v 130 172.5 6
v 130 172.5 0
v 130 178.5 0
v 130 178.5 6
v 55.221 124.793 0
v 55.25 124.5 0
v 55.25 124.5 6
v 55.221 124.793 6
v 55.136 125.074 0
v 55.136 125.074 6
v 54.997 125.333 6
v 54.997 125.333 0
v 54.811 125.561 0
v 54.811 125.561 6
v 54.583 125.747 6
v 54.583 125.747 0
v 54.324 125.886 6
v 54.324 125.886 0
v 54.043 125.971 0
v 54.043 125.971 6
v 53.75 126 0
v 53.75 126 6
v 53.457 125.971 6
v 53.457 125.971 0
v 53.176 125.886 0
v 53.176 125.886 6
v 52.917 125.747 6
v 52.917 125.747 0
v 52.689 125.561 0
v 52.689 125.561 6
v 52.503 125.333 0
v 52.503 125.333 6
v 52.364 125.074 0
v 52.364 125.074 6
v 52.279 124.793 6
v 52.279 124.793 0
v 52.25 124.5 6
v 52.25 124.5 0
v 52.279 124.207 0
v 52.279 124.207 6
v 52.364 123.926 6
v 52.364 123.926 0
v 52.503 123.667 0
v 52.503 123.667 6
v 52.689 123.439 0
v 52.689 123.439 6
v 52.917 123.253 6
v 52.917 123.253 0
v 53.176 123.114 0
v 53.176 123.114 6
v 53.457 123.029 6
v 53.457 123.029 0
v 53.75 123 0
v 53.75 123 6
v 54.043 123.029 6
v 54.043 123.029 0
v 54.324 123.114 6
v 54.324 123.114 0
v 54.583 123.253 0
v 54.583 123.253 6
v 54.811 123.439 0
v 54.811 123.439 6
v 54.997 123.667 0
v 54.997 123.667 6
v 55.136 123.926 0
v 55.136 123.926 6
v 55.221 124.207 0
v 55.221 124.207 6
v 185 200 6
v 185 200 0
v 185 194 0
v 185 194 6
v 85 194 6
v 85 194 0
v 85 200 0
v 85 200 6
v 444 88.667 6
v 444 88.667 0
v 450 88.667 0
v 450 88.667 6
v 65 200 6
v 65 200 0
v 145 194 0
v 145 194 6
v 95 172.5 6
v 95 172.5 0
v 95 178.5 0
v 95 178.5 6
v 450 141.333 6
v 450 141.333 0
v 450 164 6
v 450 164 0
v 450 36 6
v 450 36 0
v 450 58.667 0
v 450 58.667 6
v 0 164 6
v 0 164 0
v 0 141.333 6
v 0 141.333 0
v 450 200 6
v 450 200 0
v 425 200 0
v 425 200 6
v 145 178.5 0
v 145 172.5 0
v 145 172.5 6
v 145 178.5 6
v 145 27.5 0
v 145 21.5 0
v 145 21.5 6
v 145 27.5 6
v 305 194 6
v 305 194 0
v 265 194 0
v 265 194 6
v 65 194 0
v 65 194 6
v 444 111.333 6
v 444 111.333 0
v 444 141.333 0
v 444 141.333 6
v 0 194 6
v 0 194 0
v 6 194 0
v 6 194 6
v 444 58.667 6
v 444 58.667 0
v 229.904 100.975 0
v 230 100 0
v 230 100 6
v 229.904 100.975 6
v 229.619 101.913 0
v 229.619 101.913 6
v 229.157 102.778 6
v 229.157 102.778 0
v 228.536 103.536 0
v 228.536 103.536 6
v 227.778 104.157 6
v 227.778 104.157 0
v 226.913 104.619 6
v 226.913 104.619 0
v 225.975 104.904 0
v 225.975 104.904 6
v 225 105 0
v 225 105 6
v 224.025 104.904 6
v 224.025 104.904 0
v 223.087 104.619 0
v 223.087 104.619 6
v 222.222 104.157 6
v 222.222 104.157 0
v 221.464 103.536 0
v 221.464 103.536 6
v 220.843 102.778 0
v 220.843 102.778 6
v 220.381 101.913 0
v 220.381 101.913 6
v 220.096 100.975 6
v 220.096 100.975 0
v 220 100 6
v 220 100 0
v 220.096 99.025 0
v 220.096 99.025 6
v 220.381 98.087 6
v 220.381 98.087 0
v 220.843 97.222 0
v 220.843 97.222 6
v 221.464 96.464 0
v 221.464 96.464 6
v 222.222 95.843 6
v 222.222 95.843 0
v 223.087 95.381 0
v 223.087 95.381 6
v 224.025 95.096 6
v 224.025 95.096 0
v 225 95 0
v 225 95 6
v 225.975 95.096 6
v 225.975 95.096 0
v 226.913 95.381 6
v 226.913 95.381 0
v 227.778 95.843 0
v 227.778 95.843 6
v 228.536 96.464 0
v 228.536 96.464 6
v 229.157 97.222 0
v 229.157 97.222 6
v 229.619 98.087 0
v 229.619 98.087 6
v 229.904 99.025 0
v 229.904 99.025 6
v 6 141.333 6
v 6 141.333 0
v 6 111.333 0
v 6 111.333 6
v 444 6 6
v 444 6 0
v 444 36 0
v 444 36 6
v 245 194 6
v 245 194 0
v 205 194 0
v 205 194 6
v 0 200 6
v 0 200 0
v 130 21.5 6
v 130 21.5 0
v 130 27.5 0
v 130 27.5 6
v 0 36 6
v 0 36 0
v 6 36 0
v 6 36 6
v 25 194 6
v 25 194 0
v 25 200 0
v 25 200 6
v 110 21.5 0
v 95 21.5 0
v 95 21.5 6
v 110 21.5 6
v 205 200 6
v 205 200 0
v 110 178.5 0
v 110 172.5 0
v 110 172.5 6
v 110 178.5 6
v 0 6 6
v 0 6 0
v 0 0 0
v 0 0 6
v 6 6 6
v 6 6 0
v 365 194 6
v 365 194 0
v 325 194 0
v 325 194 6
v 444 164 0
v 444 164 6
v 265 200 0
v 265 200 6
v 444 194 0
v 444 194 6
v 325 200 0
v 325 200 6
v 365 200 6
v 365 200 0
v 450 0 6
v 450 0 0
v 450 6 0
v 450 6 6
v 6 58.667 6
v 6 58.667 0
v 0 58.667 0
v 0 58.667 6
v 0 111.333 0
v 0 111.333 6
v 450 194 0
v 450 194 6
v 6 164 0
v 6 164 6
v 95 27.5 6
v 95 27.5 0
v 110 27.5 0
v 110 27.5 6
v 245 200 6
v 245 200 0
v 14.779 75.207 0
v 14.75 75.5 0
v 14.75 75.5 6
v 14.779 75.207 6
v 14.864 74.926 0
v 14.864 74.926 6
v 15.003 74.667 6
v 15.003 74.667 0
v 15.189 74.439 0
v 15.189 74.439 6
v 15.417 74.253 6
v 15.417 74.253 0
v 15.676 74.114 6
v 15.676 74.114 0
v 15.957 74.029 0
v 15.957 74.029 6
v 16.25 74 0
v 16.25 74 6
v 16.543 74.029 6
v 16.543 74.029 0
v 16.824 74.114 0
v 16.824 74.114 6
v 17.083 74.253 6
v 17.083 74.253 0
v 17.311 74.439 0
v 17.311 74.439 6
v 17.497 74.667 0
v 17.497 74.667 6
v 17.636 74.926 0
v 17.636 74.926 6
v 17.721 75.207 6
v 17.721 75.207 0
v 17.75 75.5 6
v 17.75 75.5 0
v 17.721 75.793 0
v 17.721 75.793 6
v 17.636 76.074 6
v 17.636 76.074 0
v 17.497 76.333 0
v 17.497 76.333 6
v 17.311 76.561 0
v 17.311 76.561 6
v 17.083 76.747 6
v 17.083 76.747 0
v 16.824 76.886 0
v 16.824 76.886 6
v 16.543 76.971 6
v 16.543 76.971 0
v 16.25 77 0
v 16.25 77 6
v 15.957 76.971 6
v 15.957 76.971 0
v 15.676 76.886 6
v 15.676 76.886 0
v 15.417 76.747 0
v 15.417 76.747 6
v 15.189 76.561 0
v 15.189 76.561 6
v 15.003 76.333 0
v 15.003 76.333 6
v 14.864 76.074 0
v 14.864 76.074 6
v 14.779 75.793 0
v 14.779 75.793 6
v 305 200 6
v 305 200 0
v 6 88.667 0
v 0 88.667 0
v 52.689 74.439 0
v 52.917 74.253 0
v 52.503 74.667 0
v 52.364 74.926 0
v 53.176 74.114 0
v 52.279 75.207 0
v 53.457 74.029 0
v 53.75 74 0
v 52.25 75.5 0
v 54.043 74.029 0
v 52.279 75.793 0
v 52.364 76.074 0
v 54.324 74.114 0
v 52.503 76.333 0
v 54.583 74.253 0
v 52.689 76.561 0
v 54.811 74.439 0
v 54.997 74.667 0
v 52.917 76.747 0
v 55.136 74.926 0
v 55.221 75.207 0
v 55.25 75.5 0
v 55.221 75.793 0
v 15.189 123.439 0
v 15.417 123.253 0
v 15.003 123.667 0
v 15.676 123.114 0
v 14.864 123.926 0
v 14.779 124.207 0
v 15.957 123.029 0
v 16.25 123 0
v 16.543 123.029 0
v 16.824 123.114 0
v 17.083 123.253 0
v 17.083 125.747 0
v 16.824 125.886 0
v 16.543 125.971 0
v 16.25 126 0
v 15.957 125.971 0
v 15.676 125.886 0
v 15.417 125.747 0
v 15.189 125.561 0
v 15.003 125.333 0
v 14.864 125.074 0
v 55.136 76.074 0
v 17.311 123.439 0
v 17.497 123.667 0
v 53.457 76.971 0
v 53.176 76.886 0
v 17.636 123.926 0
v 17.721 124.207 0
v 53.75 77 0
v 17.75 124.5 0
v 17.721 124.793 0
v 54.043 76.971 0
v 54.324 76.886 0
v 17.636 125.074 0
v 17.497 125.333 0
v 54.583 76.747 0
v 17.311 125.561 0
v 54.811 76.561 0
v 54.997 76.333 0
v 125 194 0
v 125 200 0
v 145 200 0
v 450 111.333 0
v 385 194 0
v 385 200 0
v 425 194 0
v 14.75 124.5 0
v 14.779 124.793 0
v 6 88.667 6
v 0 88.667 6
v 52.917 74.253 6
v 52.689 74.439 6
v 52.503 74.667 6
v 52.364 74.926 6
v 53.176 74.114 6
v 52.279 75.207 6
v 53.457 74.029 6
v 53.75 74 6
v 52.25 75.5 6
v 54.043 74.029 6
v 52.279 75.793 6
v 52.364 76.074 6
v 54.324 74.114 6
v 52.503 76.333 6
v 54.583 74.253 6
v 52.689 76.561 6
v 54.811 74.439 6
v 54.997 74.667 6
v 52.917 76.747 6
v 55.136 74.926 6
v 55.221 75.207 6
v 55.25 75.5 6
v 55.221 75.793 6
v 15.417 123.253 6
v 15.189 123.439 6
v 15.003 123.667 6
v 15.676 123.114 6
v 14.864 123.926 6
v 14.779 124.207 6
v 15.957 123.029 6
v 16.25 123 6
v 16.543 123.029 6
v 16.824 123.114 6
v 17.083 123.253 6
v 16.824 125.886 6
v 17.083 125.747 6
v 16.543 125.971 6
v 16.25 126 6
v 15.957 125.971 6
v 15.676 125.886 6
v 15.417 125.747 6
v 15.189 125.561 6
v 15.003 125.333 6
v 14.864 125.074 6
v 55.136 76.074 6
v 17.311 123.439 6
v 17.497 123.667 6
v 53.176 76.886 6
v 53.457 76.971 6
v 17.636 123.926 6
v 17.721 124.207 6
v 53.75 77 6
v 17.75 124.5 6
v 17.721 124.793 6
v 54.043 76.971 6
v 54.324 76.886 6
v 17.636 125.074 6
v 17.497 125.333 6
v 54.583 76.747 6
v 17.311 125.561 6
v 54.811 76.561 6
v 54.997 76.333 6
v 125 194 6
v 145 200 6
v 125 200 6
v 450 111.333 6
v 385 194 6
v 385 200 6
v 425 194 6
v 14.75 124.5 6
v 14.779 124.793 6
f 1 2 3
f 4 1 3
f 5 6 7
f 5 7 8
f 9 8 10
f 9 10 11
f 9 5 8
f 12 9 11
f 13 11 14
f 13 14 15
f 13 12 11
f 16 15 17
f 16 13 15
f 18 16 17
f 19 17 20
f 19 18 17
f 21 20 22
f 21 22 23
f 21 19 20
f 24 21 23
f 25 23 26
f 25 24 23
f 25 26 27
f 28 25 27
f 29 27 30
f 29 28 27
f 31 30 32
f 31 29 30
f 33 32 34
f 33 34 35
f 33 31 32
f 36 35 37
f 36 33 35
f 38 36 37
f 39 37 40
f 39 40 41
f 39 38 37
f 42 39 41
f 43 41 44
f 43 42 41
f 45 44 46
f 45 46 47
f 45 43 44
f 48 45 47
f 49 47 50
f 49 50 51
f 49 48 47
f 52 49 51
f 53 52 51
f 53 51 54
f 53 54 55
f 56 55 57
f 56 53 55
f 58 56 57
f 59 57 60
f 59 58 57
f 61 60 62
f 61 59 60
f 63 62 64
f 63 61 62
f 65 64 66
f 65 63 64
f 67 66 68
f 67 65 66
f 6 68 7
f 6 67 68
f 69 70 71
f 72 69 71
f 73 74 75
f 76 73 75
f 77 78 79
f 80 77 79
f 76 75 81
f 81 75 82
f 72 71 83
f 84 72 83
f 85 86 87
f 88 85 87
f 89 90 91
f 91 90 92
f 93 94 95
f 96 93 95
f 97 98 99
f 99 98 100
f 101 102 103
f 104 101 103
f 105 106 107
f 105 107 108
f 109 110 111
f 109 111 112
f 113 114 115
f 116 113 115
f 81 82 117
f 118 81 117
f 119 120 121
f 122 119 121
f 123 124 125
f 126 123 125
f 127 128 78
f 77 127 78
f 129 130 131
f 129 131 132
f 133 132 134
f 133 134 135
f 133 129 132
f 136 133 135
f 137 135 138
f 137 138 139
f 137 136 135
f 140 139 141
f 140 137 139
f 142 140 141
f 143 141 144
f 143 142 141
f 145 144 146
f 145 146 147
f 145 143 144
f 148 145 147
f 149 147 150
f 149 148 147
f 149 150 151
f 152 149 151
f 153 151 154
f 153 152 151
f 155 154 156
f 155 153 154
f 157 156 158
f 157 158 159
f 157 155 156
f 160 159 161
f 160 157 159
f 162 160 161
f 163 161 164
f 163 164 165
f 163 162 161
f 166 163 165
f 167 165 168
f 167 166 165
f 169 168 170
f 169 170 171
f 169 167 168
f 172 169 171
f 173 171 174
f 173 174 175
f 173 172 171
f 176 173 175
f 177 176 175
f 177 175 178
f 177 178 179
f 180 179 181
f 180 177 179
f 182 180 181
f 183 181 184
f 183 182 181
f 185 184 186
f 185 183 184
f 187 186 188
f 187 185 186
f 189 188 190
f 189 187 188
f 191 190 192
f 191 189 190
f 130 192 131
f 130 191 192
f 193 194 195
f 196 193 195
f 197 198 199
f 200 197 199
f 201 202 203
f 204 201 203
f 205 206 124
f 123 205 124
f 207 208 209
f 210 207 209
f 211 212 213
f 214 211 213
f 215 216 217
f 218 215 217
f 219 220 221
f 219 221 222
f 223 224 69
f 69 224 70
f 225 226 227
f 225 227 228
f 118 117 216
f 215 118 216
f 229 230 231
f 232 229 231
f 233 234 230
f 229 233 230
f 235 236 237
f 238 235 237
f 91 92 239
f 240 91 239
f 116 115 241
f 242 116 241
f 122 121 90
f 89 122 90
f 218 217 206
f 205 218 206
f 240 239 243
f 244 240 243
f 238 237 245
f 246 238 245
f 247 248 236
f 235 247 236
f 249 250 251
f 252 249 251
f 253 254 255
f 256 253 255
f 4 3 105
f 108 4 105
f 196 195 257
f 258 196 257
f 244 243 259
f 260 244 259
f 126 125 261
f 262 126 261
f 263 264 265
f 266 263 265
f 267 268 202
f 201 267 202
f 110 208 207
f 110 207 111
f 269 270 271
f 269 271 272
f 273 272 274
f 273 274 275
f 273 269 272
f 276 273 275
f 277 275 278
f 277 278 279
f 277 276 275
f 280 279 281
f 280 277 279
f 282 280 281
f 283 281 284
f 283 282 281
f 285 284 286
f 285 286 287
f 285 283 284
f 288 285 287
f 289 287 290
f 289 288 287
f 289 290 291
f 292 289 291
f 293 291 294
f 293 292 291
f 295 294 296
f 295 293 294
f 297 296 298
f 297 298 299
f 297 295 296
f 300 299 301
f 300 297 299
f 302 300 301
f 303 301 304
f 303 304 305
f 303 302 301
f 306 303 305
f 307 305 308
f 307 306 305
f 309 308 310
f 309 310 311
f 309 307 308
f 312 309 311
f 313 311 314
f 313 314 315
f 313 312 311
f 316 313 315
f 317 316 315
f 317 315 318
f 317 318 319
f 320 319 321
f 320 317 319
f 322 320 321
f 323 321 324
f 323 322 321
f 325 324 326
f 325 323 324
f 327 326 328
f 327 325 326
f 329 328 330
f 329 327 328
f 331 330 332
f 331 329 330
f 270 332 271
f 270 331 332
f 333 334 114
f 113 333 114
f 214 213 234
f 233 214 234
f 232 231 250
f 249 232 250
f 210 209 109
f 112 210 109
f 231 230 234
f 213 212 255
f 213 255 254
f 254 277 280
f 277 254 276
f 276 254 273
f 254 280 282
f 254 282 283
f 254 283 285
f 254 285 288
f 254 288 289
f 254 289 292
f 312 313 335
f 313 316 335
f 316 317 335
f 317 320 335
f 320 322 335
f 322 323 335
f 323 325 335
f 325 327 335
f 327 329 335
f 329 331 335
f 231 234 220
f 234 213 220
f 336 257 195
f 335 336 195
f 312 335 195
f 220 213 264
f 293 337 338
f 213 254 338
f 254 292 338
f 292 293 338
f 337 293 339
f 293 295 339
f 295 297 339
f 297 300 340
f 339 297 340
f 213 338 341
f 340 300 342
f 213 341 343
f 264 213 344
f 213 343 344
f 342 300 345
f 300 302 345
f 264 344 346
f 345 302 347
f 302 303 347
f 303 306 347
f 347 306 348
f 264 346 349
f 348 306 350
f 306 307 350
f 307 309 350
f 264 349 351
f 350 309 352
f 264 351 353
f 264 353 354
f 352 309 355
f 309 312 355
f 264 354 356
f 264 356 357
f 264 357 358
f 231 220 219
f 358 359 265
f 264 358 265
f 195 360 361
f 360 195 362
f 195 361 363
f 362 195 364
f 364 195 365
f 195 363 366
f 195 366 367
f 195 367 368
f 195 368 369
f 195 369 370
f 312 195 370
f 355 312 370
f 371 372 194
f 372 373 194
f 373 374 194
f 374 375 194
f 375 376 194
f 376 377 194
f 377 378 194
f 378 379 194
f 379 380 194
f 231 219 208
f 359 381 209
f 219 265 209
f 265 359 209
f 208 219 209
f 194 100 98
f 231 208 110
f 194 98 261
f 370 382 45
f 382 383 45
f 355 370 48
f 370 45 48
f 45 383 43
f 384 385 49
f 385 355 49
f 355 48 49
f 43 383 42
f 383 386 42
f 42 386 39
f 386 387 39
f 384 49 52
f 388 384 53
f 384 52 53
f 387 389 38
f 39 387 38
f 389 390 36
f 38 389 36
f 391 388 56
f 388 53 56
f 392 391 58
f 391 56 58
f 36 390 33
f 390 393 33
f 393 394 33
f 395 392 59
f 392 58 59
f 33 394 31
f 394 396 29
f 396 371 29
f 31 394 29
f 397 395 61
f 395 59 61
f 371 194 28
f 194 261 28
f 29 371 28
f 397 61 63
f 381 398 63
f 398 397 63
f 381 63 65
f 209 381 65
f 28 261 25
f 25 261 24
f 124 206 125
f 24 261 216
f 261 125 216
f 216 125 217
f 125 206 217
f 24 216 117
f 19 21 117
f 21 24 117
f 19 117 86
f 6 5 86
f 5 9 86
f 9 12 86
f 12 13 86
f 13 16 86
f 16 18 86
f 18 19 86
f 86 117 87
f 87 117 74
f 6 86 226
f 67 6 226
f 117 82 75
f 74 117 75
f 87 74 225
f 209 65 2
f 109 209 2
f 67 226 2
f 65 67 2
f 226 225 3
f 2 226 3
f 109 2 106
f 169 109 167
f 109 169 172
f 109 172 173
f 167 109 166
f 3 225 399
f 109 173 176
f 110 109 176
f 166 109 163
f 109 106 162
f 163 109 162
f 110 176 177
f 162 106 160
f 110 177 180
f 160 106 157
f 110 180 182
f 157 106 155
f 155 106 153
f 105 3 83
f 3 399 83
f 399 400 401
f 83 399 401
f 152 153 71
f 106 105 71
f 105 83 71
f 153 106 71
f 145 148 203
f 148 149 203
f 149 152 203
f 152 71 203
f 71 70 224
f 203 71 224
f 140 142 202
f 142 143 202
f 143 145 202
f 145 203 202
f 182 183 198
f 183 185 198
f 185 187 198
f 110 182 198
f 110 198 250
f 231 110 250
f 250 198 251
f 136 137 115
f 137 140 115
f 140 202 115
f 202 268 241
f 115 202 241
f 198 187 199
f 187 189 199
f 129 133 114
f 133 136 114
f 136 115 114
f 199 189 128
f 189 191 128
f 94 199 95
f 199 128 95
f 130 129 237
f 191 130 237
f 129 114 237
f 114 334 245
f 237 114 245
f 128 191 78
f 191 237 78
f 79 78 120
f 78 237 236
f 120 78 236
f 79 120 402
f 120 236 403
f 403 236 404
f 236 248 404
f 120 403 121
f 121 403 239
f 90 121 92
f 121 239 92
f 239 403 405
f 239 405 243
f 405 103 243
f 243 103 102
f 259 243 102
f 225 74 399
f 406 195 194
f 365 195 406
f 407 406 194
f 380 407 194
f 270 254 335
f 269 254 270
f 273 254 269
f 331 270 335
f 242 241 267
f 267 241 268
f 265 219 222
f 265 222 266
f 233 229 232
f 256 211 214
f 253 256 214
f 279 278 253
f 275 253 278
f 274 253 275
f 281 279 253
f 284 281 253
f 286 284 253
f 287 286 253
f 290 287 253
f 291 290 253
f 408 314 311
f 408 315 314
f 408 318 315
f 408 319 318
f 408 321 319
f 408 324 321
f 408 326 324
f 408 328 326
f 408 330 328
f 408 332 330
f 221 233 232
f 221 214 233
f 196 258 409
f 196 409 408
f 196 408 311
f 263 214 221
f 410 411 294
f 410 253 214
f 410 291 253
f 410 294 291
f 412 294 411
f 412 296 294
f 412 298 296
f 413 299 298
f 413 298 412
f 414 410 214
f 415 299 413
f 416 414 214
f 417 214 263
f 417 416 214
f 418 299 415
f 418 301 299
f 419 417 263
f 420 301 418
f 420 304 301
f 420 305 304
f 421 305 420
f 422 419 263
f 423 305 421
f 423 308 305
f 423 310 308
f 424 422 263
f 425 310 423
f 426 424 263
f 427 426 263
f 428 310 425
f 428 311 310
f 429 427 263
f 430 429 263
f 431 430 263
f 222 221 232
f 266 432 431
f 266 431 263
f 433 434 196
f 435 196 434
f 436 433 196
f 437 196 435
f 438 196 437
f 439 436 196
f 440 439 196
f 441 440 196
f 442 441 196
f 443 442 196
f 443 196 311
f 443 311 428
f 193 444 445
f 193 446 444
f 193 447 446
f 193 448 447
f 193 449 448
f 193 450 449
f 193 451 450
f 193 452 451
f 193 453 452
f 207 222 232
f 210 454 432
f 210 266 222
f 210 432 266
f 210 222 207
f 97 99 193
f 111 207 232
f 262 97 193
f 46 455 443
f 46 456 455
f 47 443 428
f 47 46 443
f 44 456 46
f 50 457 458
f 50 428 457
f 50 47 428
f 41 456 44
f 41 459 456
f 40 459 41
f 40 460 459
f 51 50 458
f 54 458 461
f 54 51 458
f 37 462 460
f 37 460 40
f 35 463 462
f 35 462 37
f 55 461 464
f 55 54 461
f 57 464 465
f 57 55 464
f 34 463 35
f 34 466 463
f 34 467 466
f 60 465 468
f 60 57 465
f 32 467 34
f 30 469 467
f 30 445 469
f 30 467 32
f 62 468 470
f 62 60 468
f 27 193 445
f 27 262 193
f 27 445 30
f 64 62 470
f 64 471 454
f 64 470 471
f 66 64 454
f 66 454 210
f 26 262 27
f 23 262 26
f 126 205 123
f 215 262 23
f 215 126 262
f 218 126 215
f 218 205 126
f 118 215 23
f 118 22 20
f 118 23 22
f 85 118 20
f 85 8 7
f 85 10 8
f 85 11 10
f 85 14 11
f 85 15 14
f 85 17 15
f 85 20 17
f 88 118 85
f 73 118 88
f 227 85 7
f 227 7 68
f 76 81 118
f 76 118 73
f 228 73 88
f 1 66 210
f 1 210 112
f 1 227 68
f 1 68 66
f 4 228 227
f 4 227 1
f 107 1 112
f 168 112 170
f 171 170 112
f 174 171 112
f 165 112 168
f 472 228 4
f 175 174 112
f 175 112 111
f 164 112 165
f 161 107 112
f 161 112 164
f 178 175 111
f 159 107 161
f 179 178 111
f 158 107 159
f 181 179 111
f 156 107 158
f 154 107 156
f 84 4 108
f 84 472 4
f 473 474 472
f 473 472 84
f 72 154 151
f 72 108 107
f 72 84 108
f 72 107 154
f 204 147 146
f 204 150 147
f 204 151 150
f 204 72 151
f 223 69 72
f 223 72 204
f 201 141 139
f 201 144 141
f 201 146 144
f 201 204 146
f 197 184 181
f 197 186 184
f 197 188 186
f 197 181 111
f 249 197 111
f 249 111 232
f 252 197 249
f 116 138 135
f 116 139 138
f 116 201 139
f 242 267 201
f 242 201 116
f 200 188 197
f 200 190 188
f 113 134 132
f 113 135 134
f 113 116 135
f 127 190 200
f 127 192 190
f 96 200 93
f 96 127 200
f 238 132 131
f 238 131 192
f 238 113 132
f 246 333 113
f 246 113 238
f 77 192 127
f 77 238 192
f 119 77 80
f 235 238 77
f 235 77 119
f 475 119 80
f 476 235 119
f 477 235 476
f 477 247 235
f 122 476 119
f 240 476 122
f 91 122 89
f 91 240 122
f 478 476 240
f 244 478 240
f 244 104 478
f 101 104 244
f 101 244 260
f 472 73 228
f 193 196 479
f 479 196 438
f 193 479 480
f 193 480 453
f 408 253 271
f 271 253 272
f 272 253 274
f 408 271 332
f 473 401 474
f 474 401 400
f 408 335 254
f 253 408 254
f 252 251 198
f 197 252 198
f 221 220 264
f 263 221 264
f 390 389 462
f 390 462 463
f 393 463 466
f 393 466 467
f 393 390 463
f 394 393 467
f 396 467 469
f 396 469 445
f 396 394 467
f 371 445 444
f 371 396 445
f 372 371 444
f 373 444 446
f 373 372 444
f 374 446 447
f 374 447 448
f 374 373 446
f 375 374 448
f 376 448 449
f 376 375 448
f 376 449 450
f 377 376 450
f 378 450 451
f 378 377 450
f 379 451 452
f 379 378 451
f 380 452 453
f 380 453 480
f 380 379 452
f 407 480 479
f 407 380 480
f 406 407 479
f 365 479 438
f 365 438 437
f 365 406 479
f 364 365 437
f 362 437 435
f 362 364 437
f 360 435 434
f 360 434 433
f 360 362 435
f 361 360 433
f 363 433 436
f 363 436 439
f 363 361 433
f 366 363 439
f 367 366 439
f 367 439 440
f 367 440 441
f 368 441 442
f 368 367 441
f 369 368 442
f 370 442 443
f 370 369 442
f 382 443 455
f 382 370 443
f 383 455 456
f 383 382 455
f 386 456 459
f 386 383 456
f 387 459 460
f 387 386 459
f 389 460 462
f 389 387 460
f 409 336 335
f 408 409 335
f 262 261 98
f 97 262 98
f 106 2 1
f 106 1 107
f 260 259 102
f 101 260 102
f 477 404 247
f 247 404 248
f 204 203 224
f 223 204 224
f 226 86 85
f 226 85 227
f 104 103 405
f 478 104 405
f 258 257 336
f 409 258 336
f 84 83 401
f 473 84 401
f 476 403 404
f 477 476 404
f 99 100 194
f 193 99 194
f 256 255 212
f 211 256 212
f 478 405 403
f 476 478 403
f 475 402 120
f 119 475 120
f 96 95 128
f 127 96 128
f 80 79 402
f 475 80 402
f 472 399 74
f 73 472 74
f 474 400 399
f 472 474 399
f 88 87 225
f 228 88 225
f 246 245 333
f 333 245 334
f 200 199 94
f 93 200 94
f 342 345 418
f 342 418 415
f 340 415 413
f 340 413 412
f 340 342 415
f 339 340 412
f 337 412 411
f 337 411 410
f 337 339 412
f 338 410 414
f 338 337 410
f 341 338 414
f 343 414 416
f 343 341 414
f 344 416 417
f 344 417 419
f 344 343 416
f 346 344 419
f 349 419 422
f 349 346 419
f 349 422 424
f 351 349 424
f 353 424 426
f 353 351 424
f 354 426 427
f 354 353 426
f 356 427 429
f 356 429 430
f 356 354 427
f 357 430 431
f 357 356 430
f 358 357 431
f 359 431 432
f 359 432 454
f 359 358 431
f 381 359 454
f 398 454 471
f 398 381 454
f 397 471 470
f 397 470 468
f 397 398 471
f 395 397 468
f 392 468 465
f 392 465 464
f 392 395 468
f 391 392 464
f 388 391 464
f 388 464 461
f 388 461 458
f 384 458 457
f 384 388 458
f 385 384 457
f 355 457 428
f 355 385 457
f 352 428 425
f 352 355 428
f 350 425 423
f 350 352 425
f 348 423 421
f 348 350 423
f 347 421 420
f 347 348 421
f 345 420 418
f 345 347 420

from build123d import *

# Parameters (mm, degrees)
ESQUISSE1_R        = 5
ESQUISSE1_R_2      = 1.5
ESQUISSE1_W        = 15
ESQUISSE1_H        = 6
BOSS_EXTRU_1_DEPTH = 6


with BuildPart() as part:
    # Esquisse1 → Boss.-Extru.1 (new body)
    with BuildSketch(Plane.XY):
        Polygon((0, 0), (450, 0), (450, 6), (444, 6), (444, 36), (450, 36), (450, 58.666666667), (444, 58.666666667), (444, 88.666666667), (450, 88.666666667), (450, 111.333333333), (444, 111.333333333), (444, 141.333333333), (450, 141.333333333), (450, 164), (444, 164), (444, 194), (450, 194), (450, 200), (425, 200), (425, 194), (385, 194), (385, 200), (365, 200), (365, 194), (325, 194), (325, 200), (305, 200), (305, 194), (265, 194), (265, 200), (245, 200), (245, 194), (205, 194), (205, 200), (185, 200), (185, 194), (145, 194), (145, 200), (125, 200), (125, 194), (85, 194), (85, 200), (65, 200), (65, 194), (25, 194), (25, 200), (0, 200), (0, 194), (6, 194), (6, 164), (0, 164), (0, 141.333333333), (6, 141.333333333), (6, 111.333333333), (0, 111.333333333), (0, 88.666666667), (6, 88.666666667), (6, 58.666666667), (0, 58.666666667), (0, 36), (6, 36), (6, 6), (0, 6), align=None)
        with Locations((225, 100)):
            Circle(ESQUISSE1_R, mode=Mode.SUBTRACT)
        with Locations((16.25, 124.5)):
            Circle(ESQUISSE1_R_2, mode=Mode.SUBTRACT)
        with Locations((53.75, 124.5)):
            Circle(ESQUISSE1_R_2, mode=Mode.SUBTRACT)
        with Locations(Location((53.75, 75.5, 0), (0, 0, 180))):
            Circle(ESQUISSE1_R_2, mode=Mode.SUBTRACT)
        with Locations(Location((16.25, 75.5, 0), (0, 0, 180))):
            Circle(ESQUISSE1_R_2, mode=Mode.SUBTRACT)
        with Locations((137.5, 24.5)):
            Rectangle(ESQUISSE1_W, ESQUISSE1_H, mode=Mode.SUBTRACT)
        with Locations((102.5, 175.5)):
            Rectangle(ESQUISSE1_W, ESQUISSE1_H, mode=Mode.SUBTRACT)
        with Locations((137.5, 175.5)):
            Rectangle(ESQUISSE1_W, ESQUISSE1_H, mode=Mode.SUBTRACT)
        with Locations((102.5, 24.5)):
            Rectangle(ESQUISSE1_W, ESQUISSE1_H, mode=Mode.SUBTRACT)
    extrude(amount=BOSS_EXTRU_1_DEPTH)


solid = part.part
